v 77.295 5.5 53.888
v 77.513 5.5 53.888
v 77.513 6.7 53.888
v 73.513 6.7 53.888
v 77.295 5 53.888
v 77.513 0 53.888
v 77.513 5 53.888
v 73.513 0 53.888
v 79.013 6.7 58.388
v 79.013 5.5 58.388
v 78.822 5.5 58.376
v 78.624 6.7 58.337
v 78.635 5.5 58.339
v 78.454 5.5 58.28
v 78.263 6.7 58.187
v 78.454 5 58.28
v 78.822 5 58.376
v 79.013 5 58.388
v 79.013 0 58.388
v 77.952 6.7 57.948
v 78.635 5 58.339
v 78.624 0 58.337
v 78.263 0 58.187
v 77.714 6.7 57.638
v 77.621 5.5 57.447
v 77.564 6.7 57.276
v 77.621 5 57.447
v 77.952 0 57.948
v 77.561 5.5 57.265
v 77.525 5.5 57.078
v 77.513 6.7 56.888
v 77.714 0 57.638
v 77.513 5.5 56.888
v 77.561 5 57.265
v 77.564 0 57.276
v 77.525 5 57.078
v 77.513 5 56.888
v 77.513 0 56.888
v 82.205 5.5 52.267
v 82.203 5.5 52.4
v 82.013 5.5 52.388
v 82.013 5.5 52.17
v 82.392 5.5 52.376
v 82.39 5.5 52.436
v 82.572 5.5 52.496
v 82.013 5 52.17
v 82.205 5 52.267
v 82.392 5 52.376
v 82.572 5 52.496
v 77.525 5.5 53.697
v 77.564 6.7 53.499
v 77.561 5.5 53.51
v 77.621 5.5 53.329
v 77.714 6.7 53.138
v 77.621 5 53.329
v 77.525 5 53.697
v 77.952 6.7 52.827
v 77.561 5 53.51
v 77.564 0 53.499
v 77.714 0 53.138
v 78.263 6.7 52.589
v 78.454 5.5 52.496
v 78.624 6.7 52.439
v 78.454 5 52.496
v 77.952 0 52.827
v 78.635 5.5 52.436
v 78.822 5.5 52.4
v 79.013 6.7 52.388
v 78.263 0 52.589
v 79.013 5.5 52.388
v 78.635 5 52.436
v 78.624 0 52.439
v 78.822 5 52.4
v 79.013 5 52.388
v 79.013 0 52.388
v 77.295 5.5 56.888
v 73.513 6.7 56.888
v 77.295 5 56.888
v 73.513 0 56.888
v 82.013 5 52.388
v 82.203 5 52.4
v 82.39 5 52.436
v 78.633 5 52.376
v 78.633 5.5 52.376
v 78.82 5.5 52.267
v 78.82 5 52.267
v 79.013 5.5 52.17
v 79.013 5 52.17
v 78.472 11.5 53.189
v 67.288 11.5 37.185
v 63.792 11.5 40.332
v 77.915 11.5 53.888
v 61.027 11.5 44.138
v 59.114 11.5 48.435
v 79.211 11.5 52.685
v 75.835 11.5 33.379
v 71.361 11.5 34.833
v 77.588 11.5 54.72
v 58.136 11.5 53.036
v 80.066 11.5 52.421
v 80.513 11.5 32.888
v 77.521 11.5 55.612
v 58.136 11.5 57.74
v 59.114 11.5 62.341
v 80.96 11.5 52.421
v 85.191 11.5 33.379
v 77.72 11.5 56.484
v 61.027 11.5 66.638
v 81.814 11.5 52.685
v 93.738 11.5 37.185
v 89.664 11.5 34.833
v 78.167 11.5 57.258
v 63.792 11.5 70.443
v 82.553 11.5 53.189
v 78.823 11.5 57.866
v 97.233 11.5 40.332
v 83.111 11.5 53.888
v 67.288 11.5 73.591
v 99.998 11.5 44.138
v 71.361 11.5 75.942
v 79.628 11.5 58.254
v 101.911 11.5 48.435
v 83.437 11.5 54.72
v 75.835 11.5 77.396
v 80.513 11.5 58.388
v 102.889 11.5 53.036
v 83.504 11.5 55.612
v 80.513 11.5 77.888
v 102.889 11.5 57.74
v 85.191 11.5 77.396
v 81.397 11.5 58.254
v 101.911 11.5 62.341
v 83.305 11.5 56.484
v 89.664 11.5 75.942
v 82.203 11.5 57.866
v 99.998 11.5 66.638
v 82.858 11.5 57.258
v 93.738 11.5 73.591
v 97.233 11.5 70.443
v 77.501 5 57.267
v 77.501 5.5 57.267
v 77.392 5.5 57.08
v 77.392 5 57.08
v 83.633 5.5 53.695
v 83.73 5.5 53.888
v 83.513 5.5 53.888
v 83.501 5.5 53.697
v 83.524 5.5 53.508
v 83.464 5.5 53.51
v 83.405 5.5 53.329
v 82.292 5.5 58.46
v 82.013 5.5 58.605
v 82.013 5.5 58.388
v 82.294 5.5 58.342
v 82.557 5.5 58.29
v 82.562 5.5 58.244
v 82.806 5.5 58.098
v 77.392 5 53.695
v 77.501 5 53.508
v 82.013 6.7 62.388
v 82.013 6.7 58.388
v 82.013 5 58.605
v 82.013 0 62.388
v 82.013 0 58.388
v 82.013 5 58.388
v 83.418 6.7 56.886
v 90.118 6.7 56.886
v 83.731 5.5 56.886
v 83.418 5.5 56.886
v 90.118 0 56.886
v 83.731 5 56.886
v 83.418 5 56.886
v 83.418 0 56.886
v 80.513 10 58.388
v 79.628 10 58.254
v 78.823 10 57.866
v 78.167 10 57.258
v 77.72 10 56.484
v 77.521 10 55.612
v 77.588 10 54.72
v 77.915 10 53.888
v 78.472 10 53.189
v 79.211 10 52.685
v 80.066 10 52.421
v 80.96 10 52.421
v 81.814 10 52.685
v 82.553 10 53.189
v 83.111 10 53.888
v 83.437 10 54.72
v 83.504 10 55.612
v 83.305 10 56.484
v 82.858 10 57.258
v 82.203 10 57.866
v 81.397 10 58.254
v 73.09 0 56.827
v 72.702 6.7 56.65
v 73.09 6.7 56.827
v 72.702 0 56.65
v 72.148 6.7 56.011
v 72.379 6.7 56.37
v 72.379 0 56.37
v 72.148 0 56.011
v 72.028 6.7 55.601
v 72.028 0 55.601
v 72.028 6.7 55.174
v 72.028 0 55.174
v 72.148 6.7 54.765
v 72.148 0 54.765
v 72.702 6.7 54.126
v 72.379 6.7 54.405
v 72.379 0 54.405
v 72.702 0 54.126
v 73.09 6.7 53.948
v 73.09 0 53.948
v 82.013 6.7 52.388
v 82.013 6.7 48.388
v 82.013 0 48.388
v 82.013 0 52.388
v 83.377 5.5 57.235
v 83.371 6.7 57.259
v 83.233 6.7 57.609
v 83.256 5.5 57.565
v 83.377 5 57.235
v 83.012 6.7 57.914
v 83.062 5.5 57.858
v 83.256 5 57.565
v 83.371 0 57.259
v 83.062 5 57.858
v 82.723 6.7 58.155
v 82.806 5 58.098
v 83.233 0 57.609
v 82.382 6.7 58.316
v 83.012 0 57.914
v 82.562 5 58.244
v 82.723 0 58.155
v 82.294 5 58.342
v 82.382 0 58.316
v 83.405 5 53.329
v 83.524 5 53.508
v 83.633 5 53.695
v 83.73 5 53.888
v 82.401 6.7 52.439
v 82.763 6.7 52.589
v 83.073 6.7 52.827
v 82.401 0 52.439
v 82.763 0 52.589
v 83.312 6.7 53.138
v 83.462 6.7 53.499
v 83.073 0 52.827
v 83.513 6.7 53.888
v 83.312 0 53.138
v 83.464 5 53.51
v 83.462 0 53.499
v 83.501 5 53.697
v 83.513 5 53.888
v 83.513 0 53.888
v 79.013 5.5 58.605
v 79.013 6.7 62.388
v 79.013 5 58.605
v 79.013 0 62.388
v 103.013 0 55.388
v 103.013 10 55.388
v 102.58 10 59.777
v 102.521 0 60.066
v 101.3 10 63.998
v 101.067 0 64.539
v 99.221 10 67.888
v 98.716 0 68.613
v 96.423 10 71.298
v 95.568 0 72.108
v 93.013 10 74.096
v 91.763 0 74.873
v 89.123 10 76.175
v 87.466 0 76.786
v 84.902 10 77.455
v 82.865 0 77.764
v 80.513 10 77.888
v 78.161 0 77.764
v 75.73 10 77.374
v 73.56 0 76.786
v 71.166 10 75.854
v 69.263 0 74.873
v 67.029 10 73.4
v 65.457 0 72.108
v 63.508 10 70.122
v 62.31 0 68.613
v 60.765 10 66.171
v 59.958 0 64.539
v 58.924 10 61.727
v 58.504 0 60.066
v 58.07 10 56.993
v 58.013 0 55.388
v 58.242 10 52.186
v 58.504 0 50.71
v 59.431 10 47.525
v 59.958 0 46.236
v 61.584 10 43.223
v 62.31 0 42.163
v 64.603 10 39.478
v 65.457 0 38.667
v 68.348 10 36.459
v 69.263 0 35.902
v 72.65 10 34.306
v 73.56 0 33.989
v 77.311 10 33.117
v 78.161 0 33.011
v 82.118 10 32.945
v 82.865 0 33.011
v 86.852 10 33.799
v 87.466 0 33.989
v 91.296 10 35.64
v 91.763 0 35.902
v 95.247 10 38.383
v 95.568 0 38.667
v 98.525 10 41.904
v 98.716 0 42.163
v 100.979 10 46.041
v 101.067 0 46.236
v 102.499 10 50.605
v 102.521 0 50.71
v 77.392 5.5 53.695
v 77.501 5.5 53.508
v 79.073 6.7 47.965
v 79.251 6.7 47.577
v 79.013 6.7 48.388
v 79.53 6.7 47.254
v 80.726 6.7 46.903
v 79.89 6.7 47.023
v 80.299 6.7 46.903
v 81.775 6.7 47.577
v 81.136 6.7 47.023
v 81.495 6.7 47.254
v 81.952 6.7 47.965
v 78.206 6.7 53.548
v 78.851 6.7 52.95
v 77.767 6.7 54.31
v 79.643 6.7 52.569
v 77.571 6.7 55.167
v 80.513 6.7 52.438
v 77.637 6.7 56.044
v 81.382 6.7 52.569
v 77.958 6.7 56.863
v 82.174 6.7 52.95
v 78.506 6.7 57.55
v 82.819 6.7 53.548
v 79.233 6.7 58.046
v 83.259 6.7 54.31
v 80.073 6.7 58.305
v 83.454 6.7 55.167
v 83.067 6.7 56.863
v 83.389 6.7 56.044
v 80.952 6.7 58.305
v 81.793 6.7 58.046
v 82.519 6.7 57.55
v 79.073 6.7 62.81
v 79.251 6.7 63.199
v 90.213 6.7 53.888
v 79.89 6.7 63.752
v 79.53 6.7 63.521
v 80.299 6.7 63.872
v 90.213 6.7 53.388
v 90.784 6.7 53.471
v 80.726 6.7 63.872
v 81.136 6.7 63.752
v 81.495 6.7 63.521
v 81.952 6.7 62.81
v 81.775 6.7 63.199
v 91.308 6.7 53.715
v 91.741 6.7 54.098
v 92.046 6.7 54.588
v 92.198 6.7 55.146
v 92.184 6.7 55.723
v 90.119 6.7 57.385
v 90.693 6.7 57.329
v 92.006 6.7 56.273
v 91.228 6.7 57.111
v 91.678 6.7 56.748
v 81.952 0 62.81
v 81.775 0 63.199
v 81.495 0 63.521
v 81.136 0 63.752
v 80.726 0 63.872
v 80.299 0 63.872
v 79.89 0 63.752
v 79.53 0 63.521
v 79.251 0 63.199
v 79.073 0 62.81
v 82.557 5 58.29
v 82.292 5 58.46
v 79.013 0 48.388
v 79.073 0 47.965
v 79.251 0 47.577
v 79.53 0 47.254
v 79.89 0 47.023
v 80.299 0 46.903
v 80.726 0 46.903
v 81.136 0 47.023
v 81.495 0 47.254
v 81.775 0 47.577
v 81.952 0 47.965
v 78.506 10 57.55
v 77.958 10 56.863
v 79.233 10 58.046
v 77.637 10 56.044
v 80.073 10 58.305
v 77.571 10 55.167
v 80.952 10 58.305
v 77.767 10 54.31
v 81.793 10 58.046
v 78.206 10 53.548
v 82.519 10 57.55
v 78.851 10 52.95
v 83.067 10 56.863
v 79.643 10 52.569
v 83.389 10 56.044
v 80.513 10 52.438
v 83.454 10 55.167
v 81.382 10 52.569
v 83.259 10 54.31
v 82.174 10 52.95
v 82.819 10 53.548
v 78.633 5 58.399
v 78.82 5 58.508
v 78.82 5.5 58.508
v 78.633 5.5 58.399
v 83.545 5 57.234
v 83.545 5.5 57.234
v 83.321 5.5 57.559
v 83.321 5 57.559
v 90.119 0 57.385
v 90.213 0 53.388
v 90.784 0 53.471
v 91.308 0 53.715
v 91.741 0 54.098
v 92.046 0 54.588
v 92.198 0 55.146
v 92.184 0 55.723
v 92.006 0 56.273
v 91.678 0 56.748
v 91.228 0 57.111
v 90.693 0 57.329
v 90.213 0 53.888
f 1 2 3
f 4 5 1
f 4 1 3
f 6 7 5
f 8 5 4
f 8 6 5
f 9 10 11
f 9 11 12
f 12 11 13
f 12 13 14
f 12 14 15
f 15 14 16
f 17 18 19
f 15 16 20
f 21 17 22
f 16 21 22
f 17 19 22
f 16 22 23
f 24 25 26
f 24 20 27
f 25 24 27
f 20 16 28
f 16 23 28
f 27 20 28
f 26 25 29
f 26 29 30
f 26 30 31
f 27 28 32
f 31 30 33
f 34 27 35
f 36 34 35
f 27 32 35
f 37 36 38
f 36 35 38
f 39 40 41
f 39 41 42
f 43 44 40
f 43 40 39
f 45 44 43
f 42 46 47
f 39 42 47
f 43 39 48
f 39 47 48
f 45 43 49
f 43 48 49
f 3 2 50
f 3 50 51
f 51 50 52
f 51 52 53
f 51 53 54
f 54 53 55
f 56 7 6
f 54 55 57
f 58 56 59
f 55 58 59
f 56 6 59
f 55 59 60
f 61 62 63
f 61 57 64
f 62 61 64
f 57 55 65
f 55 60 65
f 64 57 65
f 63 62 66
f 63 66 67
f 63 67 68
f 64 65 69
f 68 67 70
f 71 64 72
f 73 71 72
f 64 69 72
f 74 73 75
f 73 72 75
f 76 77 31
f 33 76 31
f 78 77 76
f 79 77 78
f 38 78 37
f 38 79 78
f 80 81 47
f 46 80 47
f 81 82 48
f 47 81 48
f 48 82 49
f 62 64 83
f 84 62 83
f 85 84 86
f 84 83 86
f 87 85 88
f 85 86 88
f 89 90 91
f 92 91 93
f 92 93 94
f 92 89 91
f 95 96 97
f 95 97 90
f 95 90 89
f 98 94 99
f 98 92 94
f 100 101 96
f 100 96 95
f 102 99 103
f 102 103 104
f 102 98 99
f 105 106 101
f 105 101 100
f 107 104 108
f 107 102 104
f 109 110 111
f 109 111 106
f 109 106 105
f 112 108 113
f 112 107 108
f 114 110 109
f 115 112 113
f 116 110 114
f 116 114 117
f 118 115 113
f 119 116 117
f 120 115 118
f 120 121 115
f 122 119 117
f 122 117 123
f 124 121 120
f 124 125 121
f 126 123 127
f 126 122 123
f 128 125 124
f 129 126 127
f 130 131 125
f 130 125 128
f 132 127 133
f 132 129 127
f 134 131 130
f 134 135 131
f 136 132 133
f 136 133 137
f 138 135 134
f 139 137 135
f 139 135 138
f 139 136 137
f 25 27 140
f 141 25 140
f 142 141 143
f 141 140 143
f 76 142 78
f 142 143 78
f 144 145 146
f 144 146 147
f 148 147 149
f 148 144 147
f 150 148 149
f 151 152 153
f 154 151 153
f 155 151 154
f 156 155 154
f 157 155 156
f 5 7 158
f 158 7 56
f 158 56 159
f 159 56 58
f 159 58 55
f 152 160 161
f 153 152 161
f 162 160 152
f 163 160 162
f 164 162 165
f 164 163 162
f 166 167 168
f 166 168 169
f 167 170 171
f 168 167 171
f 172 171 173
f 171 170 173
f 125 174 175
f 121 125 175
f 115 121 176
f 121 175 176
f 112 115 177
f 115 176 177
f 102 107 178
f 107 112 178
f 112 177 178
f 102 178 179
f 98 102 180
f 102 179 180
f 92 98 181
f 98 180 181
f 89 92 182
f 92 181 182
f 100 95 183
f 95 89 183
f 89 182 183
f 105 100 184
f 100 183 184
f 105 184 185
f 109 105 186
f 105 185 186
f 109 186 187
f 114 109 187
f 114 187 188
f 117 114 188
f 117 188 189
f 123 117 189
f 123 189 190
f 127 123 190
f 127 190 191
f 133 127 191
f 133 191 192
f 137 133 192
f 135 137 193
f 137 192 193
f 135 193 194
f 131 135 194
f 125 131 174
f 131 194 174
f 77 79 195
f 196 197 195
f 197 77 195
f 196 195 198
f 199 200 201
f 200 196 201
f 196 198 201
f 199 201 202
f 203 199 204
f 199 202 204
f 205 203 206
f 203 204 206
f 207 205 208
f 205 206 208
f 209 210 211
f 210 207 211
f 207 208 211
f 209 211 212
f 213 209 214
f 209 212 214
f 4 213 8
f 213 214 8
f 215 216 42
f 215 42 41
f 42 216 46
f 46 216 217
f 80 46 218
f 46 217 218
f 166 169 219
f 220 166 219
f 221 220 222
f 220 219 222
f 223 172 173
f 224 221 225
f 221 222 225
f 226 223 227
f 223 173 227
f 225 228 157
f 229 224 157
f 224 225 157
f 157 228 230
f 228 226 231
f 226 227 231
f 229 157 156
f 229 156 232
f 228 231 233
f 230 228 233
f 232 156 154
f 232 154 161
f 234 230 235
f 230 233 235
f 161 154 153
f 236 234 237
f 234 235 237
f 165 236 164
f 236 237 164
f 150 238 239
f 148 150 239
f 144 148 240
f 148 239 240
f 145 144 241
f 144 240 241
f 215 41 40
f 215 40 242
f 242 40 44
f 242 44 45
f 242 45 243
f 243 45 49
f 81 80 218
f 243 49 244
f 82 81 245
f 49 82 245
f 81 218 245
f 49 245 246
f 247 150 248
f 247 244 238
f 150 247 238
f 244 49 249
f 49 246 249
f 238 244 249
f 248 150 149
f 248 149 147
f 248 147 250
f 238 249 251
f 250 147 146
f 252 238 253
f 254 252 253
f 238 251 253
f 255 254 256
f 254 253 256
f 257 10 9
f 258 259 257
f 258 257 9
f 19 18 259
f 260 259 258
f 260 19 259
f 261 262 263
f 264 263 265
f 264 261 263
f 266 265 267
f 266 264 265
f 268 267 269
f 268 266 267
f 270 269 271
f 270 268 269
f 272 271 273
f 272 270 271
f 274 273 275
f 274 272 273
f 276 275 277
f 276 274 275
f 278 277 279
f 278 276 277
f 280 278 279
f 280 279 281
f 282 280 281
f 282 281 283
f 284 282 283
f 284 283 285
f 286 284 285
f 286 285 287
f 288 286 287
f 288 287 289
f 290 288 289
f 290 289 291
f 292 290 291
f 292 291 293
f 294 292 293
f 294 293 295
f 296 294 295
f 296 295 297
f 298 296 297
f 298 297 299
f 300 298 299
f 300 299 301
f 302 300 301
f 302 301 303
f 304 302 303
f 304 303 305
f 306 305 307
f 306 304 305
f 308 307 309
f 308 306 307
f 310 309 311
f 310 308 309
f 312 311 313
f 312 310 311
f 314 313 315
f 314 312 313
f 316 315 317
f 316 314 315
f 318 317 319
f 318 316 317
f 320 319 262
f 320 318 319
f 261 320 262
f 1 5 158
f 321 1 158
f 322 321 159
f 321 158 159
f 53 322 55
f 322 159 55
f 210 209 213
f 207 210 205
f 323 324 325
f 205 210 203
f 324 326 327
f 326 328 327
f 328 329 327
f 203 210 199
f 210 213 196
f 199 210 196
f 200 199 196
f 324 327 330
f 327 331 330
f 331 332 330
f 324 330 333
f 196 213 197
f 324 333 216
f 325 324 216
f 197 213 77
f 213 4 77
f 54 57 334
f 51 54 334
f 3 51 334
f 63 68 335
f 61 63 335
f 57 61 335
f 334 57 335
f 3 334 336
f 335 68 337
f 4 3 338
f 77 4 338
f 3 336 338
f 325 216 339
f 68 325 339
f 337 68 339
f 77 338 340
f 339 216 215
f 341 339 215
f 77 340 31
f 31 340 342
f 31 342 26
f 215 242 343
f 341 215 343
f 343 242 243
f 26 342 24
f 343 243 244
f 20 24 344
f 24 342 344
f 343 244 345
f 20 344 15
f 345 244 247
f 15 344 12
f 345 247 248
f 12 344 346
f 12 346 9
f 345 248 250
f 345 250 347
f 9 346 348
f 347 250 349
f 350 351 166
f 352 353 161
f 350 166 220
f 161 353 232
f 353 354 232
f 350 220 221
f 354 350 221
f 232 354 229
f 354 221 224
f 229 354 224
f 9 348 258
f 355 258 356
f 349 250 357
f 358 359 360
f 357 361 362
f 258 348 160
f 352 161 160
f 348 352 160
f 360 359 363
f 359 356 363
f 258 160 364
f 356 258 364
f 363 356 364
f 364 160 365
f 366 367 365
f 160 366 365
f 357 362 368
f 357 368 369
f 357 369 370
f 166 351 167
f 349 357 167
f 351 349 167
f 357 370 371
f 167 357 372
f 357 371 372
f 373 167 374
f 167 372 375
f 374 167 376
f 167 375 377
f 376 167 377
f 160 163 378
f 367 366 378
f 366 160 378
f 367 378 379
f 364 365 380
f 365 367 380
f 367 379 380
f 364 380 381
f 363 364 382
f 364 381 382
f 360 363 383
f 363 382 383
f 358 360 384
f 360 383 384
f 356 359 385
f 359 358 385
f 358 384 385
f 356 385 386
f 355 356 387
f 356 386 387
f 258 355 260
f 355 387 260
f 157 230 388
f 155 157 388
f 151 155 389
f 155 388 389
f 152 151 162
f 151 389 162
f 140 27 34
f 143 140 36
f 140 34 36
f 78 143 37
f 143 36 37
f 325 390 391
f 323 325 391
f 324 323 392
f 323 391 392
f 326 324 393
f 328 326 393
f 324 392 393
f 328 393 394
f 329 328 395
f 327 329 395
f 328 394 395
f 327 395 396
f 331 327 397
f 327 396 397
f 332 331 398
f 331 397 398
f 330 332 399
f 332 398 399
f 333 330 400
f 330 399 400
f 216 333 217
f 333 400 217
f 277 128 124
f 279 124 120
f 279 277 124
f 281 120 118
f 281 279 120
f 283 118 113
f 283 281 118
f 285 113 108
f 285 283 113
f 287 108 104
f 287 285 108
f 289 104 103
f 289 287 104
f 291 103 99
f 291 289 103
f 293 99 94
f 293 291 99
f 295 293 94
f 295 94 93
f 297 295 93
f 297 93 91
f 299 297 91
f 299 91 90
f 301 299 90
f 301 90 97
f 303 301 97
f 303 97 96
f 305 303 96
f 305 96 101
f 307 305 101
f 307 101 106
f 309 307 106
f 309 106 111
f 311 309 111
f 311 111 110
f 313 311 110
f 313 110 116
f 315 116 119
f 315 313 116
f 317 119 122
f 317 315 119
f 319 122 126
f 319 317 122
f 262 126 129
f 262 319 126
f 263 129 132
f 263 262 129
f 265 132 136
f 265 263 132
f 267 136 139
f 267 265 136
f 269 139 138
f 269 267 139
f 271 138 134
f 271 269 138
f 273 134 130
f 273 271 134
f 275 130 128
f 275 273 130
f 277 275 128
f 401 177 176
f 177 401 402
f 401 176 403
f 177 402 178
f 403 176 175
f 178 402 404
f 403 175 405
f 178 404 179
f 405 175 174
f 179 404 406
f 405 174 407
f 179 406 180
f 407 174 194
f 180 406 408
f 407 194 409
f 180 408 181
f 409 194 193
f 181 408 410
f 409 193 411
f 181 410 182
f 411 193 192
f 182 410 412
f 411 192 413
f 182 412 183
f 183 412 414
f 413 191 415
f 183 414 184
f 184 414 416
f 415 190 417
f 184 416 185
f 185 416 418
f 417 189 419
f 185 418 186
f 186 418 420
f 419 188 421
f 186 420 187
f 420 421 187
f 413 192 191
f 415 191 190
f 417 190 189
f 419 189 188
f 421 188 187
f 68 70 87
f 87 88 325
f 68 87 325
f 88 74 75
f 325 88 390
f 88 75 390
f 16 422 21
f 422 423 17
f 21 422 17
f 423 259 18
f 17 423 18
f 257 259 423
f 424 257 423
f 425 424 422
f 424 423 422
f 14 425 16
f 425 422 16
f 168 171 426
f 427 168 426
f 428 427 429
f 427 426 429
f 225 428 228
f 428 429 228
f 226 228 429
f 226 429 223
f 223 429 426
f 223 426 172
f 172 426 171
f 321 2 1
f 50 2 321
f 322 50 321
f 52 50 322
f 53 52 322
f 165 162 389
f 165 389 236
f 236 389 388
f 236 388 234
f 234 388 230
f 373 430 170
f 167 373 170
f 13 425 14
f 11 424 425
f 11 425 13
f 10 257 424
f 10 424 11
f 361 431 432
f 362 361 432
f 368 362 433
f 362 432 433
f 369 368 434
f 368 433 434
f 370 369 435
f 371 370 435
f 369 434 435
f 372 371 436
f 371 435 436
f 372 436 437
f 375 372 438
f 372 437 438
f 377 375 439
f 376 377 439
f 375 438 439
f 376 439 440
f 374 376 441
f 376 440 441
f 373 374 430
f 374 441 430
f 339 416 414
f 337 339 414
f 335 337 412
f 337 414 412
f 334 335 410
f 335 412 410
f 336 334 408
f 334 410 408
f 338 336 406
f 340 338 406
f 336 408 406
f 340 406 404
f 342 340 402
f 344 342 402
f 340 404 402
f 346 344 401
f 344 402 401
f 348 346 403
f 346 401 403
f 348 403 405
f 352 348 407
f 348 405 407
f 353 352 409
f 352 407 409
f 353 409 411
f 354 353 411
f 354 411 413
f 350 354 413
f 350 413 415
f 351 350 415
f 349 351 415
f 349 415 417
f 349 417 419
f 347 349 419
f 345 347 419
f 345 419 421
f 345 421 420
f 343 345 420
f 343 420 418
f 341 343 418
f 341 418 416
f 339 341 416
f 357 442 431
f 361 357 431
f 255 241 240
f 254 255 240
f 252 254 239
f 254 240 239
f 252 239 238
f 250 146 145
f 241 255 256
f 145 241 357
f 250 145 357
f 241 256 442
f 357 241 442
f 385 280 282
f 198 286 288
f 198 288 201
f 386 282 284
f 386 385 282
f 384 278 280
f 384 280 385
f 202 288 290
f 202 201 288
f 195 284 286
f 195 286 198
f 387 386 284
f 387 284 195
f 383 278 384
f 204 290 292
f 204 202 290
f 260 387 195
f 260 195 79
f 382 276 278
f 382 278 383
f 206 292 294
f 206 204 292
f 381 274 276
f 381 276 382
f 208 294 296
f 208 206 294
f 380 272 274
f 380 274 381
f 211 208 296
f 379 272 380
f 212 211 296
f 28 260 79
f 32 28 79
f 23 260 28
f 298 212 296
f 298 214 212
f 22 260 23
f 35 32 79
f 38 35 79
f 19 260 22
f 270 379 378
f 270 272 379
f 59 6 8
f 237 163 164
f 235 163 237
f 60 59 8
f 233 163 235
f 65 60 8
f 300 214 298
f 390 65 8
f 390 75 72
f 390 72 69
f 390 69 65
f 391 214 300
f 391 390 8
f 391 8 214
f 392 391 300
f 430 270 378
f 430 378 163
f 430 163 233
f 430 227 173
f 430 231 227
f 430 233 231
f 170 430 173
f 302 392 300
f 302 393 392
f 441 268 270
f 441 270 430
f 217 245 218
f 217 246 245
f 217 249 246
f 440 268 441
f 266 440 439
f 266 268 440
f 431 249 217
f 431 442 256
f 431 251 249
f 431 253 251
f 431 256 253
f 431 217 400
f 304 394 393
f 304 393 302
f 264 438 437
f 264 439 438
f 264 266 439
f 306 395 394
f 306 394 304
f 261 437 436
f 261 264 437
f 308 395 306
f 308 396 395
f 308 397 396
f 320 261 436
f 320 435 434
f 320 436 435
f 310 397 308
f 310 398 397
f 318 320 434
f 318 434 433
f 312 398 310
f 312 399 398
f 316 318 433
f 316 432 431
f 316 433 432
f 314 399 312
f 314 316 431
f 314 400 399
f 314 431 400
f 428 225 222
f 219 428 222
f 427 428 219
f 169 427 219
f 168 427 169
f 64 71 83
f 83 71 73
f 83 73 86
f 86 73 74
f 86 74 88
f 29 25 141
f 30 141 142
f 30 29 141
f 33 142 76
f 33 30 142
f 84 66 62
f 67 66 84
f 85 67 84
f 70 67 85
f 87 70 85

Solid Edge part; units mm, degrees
sketch "Sketch1" plane through (0, 0, 0) normal (0, -1, 0) x (1, 0, 0)
  circle A0 centre (80.5127, 55.3877) radius 22.5
  dimension "D1" = 45
extrude "Protrusion1" add sketch "Sketch1" against normal blind 10
sketch "Sketch2" plane through (80.5127, 10, 55.3877) normal (0, 1, 0) x (0, 0, -1)
  circle A0 centre (0, 0) radius 2.95
  dimension "D1" = 5.9
extrude "ExtrudedCutout_5" cut sketch "Sketch2" against normal blind 4
sketch "Sketch3" plane through (80.5127, 6, 55.3877) normal (0, 1, 0) x (-1, 0, 0)
  circle A0 centre (0, 0) radius 1.05
  dimension "D1" = 2.1
extrude "Cutout1" cut sketch "Sketch3" against normal up to next
sketch "Sketch4" plane through (80.5127, 5, 51.1598) normal (0, -1, 0) x (1, 0, 0)
  circle A0 centre (0, 4.2279) radius 3.55
extrude "ExtrudedCutout_7" cut sketch "Sketch4" against normal blind 0.5
chamfer "Chamfer_2" distance 1.9 distance2 0.5 1 edges at (80.5127, 6, 58.3377) measured on face at (78.605, 6, 53.362)
sketch "Sketch5" plane through (80.5127, 10, 55.3877) normal (0, 1, 0) x (0, 0, 1)
  circle A0 centre (0, 0) radius 22.5
  circle A1 centre (0, 0) radius 3
  dimension "D1" = 45
extrude "ExtrudedProtrusion_4" add sketch "Sketch5" along normal blind 1.5
sketch "Sketch6" plane through (80.5127, 0, 55.3877) normal (0, -1, 0) x (0, 0, 1)
  line L0 (3, 1.5) -> (7, 1.5)
  arc A0 (7, 1.5) -> (7, -1.5) centre (7, 0) cw
  line L1 (7, -1.5) -> (3, -1.5)
  arc A1 (1.4978, -2.9058) -> (3, -1.5) centre (1.4978, -1.4002) ccw
  line L2 (1.4978, -9.6058) -> (1.4978, -2.9058)
  line L3 (1.9978, -9.6058) -> (1.4978, -9.6058)
  arc A2 (-2, -9.7) -> (1.9978, -9.6058) centre (0, -9.7) ccw
  line L4 (-1.5, -9.7) -> (-2, -9.7)
  line L5 (-1.5, -3) -> (-1.5, -9.7)
  arc A3 (-3, -1.5) -> (-1.5, -3) centre (-1.5, -1.5) ccw
  line L6 (-7, -1.5) -> (-3, -1.5)
  arc A4 (-7, 1.5) -> (-7, -1.5) centre (-7, 0) ccw
  line L7 (-3, 1.5) -> (-7, 1.5)
  arc A5 (-3, 1.5) -> (-1.5, 3) centre (-1.5, 1.5) cw
  line L8 (-1.5, 3) -> (-1.5, 7)
  arc A6 (-1.5, 7) -> (1.5, 7) centre (0, 7) cw
  line L9 (1.5, 7) -> (1.5, 3)
  arc A7 (1.5, 3) -> (3, 1.5) centre (1.5, 1.5) cw
  dimension "D1" = 4
  dimension "D2" = 1.5
  dimension "D3" = 4
  dimension "D4" = 4
  dimension "D5" = 1.5
  dimension "D6" = 3
  dimension "D7" = 3
  dimension "D8" = 6.7
  dimension "D9" = 3
  dimension "D10" = 1.5
  dimension "D11" = 2
  dimension "D12" = 0.5
  dimension "D13" = 6.7
  dimension "D14" = 4
  dimension "D15" = 4
  dimension "D16" = 1.5
  dimension "D17" = 4
extrude "ExtrudedCutout_9" cut sketch "Sketch6" against normal blind 6.7
